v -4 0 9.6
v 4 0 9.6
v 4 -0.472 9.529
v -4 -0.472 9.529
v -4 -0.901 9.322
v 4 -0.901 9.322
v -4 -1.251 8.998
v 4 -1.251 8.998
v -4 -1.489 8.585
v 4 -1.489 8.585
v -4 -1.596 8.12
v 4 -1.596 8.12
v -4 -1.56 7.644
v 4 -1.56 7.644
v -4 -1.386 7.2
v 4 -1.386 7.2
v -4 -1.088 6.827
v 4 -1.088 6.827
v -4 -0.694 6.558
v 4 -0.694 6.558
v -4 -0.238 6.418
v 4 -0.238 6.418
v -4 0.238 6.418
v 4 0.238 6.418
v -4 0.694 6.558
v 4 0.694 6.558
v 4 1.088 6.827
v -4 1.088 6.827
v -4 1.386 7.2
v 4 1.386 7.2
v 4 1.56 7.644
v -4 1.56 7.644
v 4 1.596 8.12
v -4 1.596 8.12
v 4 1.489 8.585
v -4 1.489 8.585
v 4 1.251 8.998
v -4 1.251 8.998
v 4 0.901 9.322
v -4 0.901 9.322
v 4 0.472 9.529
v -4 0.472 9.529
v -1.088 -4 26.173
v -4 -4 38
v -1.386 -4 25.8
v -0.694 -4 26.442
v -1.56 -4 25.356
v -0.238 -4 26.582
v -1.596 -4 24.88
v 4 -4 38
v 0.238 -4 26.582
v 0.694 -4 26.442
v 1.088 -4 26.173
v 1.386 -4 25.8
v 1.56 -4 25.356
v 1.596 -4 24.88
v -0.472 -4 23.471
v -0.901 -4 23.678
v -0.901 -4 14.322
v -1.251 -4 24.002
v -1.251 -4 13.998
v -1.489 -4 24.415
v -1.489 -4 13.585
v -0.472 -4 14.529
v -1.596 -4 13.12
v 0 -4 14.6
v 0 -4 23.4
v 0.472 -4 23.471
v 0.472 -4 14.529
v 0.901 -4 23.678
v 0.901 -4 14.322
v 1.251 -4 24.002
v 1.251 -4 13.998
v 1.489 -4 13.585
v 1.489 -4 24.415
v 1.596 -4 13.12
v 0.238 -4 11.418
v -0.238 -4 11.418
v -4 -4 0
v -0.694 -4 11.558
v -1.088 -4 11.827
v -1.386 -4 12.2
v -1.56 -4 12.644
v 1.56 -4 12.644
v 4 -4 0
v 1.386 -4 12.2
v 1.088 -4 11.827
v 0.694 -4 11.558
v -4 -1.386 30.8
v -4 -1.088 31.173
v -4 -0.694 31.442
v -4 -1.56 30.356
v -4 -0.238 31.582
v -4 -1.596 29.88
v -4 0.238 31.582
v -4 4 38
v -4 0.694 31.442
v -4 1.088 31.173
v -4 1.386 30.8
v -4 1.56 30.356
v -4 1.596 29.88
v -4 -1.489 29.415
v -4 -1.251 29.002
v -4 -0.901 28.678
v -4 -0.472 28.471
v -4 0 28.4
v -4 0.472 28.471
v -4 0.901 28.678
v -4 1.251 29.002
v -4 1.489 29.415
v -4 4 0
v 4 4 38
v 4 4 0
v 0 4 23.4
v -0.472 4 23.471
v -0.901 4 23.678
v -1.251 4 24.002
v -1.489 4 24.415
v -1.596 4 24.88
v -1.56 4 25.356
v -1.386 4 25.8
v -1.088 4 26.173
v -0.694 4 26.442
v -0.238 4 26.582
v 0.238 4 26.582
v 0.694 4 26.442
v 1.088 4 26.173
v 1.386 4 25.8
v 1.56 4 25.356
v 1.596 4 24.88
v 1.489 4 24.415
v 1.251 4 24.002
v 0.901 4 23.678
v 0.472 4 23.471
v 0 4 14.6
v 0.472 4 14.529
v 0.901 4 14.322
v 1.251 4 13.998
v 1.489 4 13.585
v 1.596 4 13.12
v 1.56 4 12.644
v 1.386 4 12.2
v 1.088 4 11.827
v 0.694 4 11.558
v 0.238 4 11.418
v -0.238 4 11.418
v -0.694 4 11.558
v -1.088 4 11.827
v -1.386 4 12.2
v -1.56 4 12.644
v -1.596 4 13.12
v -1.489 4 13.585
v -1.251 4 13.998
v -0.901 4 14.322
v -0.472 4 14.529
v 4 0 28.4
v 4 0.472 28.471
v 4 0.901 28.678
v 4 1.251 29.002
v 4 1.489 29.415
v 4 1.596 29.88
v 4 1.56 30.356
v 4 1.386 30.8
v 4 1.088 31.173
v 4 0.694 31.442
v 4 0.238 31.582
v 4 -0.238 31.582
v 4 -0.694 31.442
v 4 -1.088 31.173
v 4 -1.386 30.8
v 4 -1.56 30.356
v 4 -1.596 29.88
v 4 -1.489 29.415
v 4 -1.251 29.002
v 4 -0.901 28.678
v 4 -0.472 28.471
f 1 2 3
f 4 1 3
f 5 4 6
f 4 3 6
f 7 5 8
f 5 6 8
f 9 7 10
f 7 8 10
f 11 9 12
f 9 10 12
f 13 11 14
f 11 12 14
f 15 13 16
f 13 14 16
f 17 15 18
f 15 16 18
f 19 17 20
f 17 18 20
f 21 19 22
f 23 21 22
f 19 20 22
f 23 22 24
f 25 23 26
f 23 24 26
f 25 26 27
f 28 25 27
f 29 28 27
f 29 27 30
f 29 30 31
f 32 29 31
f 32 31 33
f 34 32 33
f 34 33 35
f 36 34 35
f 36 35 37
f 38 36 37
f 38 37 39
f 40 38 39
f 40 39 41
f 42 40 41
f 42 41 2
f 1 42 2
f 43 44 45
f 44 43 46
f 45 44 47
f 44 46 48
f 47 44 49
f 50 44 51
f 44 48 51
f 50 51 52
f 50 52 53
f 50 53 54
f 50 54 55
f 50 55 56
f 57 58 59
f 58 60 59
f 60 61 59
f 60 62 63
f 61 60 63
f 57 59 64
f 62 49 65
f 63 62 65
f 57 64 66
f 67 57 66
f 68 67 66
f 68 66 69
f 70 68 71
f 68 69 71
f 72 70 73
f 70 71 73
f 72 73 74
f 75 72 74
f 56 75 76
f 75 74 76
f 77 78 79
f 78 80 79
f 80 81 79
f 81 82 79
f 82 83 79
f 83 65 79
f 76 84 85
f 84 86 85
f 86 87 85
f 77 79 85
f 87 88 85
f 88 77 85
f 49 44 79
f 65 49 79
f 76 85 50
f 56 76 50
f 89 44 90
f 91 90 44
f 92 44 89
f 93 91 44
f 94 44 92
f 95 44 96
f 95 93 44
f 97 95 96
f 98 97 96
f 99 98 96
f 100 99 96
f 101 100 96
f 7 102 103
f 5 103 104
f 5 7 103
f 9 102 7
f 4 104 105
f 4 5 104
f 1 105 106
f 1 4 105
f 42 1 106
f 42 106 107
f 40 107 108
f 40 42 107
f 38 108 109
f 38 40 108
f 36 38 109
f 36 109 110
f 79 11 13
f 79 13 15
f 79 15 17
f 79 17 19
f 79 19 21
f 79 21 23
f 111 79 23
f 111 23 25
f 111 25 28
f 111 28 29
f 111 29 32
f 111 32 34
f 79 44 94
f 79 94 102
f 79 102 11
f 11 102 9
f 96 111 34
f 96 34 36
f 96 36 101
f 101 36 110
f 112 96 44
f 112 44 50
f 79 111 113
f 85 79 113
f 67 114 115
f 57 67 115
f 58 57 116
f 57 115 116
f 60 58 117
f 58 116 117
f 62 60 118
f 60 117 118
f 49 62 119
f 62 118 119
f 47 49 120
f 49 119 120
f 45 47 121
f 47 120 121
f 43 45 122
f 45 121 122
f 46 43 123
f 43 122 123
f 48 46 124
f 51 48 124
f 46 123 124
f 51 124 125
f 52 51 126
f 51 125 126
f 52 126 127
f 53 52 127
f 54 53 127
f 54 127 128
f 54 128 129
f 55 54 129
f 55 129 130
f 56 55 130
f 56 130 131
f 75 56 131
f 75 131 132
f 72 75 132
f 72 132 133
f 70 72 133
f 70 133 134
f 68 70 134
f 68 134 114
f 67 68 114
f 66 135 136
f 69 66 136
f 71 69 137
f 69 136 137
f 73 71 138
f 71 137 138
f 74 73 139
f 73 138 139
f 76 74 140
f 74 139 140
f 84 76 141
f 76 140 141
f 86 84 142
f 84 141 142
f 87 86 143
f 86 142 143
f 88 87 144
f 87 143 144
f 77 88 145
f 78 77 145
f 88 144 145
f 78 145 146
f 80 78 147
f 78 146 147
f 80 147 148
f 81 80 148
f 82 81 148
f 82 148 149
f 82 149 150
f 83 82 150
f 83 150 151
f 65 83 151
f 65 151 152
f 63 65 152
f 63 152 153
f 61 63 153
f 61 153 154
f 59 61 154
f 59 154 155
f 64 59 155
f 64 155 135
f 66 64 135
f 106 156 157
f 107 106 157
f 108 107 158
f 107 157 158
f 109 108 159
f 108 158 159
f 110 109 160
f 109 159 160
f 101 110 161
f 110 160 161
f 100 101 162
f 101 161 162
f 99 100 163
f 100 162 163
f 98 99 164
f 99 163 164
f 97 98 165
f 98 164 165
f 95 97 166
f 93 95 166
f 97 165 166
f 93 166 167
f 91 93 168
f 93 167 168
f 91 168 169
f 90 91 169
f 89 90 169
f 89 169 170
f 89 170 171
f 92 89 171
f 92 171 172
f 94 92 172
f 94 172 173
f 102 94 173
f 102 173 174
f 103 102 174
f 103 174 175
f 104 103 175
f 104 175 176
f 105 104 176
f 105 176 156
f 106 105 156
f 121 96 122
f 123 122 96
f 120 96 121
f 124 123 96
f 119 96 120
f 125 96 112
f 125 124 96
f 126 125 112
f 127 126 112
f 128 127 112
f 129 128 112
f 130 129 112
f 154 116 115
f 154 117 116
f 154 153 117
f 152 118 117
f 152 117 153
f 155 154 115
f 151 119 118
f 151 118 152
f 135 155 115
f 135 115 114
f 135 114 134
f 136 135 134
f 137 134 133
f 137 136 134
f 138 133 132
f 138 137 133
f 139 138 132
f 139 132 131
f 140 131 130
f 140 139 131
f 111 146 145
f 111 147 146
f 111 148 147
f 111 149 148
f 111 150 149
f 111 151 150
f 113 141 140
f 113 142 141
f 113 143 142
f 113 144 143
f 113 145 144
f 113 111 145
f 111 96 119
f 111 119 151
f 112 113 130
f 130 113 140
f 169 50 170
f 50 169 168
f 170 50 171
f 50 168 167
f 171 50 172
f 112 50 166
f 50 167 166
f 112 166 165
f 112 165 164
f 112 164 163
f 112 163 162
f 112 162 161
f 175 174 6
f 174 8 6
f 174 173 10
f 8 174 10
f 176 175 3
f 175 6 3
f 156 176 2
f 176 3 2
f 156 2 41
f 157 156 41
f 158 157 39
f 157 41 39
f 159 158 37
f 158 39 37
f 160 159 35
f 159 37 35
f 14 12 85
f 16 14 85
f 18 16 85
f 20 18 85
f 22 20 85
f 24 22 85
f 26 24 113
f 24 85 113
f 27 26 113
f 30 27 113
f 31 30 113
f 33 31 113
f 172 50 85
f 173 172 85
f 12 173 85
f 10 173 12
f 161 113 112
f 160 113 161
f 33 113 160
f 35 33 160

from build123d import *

# Parameters (mm, degrees)
SKETCH_1_W          = 8
SKETCH_1_H          = 8
EXTRUDE_1_DEPTH     = 38
SKETCH_3_R          = 1.6
CUT_EXTRUDE_1_DEPTH = 40.038442592
SKETCH_2_R          = 1.6
CUT_EXTRUDE_2_DEPTH = 40.038442592


with BuildPart() as part:
    # 草图1 → 凸台-拉伸1 (new body)
    with BuildSketch(Plane.XY):
        Rectangle(SKETCH_1_W, SKETCH_1_H)
    extrude(amount=EXTRUDE_1_DEPTH)

    # 草图3 → 切除-拉伸1 (cut, through all)
    with BuildSketch(Plane(origin=(0, 4, 0), x_dir=(1, 0, 0), z_dir=(0, 1, 0))):
        with Locations(Location((0, -13, 0), (0, 0, 270))):
            Circle(SKETCH_3_R)
        with Locations(Location((0, -25, 0), (0, 0, 90))):
            Circle(SKETCH_3_R)
    extrude(amount=-CUT_EXTRUDE_1_DEPTH, mode=Mode.SUBTRACT)

    # 草图2 → 切除-拉伸2 (cut, through all)
    with BuildSketch(Plane(origin=(4, 0, 0), x_dir=(0, 0, -1), z_dir=(1, 0, 0))):
        with Locations((-30, 0)):
            Circle(SKETCH_2_R)
        with Locations(Location((-8, 0, 0), (0, 0, 180))):
            Circle(SKETCH_2_R)
    extrude(amount=-CUT_EXTRUDE_2_DEPTH, mode=Mode.SUBTRACT)


solid = part.part
